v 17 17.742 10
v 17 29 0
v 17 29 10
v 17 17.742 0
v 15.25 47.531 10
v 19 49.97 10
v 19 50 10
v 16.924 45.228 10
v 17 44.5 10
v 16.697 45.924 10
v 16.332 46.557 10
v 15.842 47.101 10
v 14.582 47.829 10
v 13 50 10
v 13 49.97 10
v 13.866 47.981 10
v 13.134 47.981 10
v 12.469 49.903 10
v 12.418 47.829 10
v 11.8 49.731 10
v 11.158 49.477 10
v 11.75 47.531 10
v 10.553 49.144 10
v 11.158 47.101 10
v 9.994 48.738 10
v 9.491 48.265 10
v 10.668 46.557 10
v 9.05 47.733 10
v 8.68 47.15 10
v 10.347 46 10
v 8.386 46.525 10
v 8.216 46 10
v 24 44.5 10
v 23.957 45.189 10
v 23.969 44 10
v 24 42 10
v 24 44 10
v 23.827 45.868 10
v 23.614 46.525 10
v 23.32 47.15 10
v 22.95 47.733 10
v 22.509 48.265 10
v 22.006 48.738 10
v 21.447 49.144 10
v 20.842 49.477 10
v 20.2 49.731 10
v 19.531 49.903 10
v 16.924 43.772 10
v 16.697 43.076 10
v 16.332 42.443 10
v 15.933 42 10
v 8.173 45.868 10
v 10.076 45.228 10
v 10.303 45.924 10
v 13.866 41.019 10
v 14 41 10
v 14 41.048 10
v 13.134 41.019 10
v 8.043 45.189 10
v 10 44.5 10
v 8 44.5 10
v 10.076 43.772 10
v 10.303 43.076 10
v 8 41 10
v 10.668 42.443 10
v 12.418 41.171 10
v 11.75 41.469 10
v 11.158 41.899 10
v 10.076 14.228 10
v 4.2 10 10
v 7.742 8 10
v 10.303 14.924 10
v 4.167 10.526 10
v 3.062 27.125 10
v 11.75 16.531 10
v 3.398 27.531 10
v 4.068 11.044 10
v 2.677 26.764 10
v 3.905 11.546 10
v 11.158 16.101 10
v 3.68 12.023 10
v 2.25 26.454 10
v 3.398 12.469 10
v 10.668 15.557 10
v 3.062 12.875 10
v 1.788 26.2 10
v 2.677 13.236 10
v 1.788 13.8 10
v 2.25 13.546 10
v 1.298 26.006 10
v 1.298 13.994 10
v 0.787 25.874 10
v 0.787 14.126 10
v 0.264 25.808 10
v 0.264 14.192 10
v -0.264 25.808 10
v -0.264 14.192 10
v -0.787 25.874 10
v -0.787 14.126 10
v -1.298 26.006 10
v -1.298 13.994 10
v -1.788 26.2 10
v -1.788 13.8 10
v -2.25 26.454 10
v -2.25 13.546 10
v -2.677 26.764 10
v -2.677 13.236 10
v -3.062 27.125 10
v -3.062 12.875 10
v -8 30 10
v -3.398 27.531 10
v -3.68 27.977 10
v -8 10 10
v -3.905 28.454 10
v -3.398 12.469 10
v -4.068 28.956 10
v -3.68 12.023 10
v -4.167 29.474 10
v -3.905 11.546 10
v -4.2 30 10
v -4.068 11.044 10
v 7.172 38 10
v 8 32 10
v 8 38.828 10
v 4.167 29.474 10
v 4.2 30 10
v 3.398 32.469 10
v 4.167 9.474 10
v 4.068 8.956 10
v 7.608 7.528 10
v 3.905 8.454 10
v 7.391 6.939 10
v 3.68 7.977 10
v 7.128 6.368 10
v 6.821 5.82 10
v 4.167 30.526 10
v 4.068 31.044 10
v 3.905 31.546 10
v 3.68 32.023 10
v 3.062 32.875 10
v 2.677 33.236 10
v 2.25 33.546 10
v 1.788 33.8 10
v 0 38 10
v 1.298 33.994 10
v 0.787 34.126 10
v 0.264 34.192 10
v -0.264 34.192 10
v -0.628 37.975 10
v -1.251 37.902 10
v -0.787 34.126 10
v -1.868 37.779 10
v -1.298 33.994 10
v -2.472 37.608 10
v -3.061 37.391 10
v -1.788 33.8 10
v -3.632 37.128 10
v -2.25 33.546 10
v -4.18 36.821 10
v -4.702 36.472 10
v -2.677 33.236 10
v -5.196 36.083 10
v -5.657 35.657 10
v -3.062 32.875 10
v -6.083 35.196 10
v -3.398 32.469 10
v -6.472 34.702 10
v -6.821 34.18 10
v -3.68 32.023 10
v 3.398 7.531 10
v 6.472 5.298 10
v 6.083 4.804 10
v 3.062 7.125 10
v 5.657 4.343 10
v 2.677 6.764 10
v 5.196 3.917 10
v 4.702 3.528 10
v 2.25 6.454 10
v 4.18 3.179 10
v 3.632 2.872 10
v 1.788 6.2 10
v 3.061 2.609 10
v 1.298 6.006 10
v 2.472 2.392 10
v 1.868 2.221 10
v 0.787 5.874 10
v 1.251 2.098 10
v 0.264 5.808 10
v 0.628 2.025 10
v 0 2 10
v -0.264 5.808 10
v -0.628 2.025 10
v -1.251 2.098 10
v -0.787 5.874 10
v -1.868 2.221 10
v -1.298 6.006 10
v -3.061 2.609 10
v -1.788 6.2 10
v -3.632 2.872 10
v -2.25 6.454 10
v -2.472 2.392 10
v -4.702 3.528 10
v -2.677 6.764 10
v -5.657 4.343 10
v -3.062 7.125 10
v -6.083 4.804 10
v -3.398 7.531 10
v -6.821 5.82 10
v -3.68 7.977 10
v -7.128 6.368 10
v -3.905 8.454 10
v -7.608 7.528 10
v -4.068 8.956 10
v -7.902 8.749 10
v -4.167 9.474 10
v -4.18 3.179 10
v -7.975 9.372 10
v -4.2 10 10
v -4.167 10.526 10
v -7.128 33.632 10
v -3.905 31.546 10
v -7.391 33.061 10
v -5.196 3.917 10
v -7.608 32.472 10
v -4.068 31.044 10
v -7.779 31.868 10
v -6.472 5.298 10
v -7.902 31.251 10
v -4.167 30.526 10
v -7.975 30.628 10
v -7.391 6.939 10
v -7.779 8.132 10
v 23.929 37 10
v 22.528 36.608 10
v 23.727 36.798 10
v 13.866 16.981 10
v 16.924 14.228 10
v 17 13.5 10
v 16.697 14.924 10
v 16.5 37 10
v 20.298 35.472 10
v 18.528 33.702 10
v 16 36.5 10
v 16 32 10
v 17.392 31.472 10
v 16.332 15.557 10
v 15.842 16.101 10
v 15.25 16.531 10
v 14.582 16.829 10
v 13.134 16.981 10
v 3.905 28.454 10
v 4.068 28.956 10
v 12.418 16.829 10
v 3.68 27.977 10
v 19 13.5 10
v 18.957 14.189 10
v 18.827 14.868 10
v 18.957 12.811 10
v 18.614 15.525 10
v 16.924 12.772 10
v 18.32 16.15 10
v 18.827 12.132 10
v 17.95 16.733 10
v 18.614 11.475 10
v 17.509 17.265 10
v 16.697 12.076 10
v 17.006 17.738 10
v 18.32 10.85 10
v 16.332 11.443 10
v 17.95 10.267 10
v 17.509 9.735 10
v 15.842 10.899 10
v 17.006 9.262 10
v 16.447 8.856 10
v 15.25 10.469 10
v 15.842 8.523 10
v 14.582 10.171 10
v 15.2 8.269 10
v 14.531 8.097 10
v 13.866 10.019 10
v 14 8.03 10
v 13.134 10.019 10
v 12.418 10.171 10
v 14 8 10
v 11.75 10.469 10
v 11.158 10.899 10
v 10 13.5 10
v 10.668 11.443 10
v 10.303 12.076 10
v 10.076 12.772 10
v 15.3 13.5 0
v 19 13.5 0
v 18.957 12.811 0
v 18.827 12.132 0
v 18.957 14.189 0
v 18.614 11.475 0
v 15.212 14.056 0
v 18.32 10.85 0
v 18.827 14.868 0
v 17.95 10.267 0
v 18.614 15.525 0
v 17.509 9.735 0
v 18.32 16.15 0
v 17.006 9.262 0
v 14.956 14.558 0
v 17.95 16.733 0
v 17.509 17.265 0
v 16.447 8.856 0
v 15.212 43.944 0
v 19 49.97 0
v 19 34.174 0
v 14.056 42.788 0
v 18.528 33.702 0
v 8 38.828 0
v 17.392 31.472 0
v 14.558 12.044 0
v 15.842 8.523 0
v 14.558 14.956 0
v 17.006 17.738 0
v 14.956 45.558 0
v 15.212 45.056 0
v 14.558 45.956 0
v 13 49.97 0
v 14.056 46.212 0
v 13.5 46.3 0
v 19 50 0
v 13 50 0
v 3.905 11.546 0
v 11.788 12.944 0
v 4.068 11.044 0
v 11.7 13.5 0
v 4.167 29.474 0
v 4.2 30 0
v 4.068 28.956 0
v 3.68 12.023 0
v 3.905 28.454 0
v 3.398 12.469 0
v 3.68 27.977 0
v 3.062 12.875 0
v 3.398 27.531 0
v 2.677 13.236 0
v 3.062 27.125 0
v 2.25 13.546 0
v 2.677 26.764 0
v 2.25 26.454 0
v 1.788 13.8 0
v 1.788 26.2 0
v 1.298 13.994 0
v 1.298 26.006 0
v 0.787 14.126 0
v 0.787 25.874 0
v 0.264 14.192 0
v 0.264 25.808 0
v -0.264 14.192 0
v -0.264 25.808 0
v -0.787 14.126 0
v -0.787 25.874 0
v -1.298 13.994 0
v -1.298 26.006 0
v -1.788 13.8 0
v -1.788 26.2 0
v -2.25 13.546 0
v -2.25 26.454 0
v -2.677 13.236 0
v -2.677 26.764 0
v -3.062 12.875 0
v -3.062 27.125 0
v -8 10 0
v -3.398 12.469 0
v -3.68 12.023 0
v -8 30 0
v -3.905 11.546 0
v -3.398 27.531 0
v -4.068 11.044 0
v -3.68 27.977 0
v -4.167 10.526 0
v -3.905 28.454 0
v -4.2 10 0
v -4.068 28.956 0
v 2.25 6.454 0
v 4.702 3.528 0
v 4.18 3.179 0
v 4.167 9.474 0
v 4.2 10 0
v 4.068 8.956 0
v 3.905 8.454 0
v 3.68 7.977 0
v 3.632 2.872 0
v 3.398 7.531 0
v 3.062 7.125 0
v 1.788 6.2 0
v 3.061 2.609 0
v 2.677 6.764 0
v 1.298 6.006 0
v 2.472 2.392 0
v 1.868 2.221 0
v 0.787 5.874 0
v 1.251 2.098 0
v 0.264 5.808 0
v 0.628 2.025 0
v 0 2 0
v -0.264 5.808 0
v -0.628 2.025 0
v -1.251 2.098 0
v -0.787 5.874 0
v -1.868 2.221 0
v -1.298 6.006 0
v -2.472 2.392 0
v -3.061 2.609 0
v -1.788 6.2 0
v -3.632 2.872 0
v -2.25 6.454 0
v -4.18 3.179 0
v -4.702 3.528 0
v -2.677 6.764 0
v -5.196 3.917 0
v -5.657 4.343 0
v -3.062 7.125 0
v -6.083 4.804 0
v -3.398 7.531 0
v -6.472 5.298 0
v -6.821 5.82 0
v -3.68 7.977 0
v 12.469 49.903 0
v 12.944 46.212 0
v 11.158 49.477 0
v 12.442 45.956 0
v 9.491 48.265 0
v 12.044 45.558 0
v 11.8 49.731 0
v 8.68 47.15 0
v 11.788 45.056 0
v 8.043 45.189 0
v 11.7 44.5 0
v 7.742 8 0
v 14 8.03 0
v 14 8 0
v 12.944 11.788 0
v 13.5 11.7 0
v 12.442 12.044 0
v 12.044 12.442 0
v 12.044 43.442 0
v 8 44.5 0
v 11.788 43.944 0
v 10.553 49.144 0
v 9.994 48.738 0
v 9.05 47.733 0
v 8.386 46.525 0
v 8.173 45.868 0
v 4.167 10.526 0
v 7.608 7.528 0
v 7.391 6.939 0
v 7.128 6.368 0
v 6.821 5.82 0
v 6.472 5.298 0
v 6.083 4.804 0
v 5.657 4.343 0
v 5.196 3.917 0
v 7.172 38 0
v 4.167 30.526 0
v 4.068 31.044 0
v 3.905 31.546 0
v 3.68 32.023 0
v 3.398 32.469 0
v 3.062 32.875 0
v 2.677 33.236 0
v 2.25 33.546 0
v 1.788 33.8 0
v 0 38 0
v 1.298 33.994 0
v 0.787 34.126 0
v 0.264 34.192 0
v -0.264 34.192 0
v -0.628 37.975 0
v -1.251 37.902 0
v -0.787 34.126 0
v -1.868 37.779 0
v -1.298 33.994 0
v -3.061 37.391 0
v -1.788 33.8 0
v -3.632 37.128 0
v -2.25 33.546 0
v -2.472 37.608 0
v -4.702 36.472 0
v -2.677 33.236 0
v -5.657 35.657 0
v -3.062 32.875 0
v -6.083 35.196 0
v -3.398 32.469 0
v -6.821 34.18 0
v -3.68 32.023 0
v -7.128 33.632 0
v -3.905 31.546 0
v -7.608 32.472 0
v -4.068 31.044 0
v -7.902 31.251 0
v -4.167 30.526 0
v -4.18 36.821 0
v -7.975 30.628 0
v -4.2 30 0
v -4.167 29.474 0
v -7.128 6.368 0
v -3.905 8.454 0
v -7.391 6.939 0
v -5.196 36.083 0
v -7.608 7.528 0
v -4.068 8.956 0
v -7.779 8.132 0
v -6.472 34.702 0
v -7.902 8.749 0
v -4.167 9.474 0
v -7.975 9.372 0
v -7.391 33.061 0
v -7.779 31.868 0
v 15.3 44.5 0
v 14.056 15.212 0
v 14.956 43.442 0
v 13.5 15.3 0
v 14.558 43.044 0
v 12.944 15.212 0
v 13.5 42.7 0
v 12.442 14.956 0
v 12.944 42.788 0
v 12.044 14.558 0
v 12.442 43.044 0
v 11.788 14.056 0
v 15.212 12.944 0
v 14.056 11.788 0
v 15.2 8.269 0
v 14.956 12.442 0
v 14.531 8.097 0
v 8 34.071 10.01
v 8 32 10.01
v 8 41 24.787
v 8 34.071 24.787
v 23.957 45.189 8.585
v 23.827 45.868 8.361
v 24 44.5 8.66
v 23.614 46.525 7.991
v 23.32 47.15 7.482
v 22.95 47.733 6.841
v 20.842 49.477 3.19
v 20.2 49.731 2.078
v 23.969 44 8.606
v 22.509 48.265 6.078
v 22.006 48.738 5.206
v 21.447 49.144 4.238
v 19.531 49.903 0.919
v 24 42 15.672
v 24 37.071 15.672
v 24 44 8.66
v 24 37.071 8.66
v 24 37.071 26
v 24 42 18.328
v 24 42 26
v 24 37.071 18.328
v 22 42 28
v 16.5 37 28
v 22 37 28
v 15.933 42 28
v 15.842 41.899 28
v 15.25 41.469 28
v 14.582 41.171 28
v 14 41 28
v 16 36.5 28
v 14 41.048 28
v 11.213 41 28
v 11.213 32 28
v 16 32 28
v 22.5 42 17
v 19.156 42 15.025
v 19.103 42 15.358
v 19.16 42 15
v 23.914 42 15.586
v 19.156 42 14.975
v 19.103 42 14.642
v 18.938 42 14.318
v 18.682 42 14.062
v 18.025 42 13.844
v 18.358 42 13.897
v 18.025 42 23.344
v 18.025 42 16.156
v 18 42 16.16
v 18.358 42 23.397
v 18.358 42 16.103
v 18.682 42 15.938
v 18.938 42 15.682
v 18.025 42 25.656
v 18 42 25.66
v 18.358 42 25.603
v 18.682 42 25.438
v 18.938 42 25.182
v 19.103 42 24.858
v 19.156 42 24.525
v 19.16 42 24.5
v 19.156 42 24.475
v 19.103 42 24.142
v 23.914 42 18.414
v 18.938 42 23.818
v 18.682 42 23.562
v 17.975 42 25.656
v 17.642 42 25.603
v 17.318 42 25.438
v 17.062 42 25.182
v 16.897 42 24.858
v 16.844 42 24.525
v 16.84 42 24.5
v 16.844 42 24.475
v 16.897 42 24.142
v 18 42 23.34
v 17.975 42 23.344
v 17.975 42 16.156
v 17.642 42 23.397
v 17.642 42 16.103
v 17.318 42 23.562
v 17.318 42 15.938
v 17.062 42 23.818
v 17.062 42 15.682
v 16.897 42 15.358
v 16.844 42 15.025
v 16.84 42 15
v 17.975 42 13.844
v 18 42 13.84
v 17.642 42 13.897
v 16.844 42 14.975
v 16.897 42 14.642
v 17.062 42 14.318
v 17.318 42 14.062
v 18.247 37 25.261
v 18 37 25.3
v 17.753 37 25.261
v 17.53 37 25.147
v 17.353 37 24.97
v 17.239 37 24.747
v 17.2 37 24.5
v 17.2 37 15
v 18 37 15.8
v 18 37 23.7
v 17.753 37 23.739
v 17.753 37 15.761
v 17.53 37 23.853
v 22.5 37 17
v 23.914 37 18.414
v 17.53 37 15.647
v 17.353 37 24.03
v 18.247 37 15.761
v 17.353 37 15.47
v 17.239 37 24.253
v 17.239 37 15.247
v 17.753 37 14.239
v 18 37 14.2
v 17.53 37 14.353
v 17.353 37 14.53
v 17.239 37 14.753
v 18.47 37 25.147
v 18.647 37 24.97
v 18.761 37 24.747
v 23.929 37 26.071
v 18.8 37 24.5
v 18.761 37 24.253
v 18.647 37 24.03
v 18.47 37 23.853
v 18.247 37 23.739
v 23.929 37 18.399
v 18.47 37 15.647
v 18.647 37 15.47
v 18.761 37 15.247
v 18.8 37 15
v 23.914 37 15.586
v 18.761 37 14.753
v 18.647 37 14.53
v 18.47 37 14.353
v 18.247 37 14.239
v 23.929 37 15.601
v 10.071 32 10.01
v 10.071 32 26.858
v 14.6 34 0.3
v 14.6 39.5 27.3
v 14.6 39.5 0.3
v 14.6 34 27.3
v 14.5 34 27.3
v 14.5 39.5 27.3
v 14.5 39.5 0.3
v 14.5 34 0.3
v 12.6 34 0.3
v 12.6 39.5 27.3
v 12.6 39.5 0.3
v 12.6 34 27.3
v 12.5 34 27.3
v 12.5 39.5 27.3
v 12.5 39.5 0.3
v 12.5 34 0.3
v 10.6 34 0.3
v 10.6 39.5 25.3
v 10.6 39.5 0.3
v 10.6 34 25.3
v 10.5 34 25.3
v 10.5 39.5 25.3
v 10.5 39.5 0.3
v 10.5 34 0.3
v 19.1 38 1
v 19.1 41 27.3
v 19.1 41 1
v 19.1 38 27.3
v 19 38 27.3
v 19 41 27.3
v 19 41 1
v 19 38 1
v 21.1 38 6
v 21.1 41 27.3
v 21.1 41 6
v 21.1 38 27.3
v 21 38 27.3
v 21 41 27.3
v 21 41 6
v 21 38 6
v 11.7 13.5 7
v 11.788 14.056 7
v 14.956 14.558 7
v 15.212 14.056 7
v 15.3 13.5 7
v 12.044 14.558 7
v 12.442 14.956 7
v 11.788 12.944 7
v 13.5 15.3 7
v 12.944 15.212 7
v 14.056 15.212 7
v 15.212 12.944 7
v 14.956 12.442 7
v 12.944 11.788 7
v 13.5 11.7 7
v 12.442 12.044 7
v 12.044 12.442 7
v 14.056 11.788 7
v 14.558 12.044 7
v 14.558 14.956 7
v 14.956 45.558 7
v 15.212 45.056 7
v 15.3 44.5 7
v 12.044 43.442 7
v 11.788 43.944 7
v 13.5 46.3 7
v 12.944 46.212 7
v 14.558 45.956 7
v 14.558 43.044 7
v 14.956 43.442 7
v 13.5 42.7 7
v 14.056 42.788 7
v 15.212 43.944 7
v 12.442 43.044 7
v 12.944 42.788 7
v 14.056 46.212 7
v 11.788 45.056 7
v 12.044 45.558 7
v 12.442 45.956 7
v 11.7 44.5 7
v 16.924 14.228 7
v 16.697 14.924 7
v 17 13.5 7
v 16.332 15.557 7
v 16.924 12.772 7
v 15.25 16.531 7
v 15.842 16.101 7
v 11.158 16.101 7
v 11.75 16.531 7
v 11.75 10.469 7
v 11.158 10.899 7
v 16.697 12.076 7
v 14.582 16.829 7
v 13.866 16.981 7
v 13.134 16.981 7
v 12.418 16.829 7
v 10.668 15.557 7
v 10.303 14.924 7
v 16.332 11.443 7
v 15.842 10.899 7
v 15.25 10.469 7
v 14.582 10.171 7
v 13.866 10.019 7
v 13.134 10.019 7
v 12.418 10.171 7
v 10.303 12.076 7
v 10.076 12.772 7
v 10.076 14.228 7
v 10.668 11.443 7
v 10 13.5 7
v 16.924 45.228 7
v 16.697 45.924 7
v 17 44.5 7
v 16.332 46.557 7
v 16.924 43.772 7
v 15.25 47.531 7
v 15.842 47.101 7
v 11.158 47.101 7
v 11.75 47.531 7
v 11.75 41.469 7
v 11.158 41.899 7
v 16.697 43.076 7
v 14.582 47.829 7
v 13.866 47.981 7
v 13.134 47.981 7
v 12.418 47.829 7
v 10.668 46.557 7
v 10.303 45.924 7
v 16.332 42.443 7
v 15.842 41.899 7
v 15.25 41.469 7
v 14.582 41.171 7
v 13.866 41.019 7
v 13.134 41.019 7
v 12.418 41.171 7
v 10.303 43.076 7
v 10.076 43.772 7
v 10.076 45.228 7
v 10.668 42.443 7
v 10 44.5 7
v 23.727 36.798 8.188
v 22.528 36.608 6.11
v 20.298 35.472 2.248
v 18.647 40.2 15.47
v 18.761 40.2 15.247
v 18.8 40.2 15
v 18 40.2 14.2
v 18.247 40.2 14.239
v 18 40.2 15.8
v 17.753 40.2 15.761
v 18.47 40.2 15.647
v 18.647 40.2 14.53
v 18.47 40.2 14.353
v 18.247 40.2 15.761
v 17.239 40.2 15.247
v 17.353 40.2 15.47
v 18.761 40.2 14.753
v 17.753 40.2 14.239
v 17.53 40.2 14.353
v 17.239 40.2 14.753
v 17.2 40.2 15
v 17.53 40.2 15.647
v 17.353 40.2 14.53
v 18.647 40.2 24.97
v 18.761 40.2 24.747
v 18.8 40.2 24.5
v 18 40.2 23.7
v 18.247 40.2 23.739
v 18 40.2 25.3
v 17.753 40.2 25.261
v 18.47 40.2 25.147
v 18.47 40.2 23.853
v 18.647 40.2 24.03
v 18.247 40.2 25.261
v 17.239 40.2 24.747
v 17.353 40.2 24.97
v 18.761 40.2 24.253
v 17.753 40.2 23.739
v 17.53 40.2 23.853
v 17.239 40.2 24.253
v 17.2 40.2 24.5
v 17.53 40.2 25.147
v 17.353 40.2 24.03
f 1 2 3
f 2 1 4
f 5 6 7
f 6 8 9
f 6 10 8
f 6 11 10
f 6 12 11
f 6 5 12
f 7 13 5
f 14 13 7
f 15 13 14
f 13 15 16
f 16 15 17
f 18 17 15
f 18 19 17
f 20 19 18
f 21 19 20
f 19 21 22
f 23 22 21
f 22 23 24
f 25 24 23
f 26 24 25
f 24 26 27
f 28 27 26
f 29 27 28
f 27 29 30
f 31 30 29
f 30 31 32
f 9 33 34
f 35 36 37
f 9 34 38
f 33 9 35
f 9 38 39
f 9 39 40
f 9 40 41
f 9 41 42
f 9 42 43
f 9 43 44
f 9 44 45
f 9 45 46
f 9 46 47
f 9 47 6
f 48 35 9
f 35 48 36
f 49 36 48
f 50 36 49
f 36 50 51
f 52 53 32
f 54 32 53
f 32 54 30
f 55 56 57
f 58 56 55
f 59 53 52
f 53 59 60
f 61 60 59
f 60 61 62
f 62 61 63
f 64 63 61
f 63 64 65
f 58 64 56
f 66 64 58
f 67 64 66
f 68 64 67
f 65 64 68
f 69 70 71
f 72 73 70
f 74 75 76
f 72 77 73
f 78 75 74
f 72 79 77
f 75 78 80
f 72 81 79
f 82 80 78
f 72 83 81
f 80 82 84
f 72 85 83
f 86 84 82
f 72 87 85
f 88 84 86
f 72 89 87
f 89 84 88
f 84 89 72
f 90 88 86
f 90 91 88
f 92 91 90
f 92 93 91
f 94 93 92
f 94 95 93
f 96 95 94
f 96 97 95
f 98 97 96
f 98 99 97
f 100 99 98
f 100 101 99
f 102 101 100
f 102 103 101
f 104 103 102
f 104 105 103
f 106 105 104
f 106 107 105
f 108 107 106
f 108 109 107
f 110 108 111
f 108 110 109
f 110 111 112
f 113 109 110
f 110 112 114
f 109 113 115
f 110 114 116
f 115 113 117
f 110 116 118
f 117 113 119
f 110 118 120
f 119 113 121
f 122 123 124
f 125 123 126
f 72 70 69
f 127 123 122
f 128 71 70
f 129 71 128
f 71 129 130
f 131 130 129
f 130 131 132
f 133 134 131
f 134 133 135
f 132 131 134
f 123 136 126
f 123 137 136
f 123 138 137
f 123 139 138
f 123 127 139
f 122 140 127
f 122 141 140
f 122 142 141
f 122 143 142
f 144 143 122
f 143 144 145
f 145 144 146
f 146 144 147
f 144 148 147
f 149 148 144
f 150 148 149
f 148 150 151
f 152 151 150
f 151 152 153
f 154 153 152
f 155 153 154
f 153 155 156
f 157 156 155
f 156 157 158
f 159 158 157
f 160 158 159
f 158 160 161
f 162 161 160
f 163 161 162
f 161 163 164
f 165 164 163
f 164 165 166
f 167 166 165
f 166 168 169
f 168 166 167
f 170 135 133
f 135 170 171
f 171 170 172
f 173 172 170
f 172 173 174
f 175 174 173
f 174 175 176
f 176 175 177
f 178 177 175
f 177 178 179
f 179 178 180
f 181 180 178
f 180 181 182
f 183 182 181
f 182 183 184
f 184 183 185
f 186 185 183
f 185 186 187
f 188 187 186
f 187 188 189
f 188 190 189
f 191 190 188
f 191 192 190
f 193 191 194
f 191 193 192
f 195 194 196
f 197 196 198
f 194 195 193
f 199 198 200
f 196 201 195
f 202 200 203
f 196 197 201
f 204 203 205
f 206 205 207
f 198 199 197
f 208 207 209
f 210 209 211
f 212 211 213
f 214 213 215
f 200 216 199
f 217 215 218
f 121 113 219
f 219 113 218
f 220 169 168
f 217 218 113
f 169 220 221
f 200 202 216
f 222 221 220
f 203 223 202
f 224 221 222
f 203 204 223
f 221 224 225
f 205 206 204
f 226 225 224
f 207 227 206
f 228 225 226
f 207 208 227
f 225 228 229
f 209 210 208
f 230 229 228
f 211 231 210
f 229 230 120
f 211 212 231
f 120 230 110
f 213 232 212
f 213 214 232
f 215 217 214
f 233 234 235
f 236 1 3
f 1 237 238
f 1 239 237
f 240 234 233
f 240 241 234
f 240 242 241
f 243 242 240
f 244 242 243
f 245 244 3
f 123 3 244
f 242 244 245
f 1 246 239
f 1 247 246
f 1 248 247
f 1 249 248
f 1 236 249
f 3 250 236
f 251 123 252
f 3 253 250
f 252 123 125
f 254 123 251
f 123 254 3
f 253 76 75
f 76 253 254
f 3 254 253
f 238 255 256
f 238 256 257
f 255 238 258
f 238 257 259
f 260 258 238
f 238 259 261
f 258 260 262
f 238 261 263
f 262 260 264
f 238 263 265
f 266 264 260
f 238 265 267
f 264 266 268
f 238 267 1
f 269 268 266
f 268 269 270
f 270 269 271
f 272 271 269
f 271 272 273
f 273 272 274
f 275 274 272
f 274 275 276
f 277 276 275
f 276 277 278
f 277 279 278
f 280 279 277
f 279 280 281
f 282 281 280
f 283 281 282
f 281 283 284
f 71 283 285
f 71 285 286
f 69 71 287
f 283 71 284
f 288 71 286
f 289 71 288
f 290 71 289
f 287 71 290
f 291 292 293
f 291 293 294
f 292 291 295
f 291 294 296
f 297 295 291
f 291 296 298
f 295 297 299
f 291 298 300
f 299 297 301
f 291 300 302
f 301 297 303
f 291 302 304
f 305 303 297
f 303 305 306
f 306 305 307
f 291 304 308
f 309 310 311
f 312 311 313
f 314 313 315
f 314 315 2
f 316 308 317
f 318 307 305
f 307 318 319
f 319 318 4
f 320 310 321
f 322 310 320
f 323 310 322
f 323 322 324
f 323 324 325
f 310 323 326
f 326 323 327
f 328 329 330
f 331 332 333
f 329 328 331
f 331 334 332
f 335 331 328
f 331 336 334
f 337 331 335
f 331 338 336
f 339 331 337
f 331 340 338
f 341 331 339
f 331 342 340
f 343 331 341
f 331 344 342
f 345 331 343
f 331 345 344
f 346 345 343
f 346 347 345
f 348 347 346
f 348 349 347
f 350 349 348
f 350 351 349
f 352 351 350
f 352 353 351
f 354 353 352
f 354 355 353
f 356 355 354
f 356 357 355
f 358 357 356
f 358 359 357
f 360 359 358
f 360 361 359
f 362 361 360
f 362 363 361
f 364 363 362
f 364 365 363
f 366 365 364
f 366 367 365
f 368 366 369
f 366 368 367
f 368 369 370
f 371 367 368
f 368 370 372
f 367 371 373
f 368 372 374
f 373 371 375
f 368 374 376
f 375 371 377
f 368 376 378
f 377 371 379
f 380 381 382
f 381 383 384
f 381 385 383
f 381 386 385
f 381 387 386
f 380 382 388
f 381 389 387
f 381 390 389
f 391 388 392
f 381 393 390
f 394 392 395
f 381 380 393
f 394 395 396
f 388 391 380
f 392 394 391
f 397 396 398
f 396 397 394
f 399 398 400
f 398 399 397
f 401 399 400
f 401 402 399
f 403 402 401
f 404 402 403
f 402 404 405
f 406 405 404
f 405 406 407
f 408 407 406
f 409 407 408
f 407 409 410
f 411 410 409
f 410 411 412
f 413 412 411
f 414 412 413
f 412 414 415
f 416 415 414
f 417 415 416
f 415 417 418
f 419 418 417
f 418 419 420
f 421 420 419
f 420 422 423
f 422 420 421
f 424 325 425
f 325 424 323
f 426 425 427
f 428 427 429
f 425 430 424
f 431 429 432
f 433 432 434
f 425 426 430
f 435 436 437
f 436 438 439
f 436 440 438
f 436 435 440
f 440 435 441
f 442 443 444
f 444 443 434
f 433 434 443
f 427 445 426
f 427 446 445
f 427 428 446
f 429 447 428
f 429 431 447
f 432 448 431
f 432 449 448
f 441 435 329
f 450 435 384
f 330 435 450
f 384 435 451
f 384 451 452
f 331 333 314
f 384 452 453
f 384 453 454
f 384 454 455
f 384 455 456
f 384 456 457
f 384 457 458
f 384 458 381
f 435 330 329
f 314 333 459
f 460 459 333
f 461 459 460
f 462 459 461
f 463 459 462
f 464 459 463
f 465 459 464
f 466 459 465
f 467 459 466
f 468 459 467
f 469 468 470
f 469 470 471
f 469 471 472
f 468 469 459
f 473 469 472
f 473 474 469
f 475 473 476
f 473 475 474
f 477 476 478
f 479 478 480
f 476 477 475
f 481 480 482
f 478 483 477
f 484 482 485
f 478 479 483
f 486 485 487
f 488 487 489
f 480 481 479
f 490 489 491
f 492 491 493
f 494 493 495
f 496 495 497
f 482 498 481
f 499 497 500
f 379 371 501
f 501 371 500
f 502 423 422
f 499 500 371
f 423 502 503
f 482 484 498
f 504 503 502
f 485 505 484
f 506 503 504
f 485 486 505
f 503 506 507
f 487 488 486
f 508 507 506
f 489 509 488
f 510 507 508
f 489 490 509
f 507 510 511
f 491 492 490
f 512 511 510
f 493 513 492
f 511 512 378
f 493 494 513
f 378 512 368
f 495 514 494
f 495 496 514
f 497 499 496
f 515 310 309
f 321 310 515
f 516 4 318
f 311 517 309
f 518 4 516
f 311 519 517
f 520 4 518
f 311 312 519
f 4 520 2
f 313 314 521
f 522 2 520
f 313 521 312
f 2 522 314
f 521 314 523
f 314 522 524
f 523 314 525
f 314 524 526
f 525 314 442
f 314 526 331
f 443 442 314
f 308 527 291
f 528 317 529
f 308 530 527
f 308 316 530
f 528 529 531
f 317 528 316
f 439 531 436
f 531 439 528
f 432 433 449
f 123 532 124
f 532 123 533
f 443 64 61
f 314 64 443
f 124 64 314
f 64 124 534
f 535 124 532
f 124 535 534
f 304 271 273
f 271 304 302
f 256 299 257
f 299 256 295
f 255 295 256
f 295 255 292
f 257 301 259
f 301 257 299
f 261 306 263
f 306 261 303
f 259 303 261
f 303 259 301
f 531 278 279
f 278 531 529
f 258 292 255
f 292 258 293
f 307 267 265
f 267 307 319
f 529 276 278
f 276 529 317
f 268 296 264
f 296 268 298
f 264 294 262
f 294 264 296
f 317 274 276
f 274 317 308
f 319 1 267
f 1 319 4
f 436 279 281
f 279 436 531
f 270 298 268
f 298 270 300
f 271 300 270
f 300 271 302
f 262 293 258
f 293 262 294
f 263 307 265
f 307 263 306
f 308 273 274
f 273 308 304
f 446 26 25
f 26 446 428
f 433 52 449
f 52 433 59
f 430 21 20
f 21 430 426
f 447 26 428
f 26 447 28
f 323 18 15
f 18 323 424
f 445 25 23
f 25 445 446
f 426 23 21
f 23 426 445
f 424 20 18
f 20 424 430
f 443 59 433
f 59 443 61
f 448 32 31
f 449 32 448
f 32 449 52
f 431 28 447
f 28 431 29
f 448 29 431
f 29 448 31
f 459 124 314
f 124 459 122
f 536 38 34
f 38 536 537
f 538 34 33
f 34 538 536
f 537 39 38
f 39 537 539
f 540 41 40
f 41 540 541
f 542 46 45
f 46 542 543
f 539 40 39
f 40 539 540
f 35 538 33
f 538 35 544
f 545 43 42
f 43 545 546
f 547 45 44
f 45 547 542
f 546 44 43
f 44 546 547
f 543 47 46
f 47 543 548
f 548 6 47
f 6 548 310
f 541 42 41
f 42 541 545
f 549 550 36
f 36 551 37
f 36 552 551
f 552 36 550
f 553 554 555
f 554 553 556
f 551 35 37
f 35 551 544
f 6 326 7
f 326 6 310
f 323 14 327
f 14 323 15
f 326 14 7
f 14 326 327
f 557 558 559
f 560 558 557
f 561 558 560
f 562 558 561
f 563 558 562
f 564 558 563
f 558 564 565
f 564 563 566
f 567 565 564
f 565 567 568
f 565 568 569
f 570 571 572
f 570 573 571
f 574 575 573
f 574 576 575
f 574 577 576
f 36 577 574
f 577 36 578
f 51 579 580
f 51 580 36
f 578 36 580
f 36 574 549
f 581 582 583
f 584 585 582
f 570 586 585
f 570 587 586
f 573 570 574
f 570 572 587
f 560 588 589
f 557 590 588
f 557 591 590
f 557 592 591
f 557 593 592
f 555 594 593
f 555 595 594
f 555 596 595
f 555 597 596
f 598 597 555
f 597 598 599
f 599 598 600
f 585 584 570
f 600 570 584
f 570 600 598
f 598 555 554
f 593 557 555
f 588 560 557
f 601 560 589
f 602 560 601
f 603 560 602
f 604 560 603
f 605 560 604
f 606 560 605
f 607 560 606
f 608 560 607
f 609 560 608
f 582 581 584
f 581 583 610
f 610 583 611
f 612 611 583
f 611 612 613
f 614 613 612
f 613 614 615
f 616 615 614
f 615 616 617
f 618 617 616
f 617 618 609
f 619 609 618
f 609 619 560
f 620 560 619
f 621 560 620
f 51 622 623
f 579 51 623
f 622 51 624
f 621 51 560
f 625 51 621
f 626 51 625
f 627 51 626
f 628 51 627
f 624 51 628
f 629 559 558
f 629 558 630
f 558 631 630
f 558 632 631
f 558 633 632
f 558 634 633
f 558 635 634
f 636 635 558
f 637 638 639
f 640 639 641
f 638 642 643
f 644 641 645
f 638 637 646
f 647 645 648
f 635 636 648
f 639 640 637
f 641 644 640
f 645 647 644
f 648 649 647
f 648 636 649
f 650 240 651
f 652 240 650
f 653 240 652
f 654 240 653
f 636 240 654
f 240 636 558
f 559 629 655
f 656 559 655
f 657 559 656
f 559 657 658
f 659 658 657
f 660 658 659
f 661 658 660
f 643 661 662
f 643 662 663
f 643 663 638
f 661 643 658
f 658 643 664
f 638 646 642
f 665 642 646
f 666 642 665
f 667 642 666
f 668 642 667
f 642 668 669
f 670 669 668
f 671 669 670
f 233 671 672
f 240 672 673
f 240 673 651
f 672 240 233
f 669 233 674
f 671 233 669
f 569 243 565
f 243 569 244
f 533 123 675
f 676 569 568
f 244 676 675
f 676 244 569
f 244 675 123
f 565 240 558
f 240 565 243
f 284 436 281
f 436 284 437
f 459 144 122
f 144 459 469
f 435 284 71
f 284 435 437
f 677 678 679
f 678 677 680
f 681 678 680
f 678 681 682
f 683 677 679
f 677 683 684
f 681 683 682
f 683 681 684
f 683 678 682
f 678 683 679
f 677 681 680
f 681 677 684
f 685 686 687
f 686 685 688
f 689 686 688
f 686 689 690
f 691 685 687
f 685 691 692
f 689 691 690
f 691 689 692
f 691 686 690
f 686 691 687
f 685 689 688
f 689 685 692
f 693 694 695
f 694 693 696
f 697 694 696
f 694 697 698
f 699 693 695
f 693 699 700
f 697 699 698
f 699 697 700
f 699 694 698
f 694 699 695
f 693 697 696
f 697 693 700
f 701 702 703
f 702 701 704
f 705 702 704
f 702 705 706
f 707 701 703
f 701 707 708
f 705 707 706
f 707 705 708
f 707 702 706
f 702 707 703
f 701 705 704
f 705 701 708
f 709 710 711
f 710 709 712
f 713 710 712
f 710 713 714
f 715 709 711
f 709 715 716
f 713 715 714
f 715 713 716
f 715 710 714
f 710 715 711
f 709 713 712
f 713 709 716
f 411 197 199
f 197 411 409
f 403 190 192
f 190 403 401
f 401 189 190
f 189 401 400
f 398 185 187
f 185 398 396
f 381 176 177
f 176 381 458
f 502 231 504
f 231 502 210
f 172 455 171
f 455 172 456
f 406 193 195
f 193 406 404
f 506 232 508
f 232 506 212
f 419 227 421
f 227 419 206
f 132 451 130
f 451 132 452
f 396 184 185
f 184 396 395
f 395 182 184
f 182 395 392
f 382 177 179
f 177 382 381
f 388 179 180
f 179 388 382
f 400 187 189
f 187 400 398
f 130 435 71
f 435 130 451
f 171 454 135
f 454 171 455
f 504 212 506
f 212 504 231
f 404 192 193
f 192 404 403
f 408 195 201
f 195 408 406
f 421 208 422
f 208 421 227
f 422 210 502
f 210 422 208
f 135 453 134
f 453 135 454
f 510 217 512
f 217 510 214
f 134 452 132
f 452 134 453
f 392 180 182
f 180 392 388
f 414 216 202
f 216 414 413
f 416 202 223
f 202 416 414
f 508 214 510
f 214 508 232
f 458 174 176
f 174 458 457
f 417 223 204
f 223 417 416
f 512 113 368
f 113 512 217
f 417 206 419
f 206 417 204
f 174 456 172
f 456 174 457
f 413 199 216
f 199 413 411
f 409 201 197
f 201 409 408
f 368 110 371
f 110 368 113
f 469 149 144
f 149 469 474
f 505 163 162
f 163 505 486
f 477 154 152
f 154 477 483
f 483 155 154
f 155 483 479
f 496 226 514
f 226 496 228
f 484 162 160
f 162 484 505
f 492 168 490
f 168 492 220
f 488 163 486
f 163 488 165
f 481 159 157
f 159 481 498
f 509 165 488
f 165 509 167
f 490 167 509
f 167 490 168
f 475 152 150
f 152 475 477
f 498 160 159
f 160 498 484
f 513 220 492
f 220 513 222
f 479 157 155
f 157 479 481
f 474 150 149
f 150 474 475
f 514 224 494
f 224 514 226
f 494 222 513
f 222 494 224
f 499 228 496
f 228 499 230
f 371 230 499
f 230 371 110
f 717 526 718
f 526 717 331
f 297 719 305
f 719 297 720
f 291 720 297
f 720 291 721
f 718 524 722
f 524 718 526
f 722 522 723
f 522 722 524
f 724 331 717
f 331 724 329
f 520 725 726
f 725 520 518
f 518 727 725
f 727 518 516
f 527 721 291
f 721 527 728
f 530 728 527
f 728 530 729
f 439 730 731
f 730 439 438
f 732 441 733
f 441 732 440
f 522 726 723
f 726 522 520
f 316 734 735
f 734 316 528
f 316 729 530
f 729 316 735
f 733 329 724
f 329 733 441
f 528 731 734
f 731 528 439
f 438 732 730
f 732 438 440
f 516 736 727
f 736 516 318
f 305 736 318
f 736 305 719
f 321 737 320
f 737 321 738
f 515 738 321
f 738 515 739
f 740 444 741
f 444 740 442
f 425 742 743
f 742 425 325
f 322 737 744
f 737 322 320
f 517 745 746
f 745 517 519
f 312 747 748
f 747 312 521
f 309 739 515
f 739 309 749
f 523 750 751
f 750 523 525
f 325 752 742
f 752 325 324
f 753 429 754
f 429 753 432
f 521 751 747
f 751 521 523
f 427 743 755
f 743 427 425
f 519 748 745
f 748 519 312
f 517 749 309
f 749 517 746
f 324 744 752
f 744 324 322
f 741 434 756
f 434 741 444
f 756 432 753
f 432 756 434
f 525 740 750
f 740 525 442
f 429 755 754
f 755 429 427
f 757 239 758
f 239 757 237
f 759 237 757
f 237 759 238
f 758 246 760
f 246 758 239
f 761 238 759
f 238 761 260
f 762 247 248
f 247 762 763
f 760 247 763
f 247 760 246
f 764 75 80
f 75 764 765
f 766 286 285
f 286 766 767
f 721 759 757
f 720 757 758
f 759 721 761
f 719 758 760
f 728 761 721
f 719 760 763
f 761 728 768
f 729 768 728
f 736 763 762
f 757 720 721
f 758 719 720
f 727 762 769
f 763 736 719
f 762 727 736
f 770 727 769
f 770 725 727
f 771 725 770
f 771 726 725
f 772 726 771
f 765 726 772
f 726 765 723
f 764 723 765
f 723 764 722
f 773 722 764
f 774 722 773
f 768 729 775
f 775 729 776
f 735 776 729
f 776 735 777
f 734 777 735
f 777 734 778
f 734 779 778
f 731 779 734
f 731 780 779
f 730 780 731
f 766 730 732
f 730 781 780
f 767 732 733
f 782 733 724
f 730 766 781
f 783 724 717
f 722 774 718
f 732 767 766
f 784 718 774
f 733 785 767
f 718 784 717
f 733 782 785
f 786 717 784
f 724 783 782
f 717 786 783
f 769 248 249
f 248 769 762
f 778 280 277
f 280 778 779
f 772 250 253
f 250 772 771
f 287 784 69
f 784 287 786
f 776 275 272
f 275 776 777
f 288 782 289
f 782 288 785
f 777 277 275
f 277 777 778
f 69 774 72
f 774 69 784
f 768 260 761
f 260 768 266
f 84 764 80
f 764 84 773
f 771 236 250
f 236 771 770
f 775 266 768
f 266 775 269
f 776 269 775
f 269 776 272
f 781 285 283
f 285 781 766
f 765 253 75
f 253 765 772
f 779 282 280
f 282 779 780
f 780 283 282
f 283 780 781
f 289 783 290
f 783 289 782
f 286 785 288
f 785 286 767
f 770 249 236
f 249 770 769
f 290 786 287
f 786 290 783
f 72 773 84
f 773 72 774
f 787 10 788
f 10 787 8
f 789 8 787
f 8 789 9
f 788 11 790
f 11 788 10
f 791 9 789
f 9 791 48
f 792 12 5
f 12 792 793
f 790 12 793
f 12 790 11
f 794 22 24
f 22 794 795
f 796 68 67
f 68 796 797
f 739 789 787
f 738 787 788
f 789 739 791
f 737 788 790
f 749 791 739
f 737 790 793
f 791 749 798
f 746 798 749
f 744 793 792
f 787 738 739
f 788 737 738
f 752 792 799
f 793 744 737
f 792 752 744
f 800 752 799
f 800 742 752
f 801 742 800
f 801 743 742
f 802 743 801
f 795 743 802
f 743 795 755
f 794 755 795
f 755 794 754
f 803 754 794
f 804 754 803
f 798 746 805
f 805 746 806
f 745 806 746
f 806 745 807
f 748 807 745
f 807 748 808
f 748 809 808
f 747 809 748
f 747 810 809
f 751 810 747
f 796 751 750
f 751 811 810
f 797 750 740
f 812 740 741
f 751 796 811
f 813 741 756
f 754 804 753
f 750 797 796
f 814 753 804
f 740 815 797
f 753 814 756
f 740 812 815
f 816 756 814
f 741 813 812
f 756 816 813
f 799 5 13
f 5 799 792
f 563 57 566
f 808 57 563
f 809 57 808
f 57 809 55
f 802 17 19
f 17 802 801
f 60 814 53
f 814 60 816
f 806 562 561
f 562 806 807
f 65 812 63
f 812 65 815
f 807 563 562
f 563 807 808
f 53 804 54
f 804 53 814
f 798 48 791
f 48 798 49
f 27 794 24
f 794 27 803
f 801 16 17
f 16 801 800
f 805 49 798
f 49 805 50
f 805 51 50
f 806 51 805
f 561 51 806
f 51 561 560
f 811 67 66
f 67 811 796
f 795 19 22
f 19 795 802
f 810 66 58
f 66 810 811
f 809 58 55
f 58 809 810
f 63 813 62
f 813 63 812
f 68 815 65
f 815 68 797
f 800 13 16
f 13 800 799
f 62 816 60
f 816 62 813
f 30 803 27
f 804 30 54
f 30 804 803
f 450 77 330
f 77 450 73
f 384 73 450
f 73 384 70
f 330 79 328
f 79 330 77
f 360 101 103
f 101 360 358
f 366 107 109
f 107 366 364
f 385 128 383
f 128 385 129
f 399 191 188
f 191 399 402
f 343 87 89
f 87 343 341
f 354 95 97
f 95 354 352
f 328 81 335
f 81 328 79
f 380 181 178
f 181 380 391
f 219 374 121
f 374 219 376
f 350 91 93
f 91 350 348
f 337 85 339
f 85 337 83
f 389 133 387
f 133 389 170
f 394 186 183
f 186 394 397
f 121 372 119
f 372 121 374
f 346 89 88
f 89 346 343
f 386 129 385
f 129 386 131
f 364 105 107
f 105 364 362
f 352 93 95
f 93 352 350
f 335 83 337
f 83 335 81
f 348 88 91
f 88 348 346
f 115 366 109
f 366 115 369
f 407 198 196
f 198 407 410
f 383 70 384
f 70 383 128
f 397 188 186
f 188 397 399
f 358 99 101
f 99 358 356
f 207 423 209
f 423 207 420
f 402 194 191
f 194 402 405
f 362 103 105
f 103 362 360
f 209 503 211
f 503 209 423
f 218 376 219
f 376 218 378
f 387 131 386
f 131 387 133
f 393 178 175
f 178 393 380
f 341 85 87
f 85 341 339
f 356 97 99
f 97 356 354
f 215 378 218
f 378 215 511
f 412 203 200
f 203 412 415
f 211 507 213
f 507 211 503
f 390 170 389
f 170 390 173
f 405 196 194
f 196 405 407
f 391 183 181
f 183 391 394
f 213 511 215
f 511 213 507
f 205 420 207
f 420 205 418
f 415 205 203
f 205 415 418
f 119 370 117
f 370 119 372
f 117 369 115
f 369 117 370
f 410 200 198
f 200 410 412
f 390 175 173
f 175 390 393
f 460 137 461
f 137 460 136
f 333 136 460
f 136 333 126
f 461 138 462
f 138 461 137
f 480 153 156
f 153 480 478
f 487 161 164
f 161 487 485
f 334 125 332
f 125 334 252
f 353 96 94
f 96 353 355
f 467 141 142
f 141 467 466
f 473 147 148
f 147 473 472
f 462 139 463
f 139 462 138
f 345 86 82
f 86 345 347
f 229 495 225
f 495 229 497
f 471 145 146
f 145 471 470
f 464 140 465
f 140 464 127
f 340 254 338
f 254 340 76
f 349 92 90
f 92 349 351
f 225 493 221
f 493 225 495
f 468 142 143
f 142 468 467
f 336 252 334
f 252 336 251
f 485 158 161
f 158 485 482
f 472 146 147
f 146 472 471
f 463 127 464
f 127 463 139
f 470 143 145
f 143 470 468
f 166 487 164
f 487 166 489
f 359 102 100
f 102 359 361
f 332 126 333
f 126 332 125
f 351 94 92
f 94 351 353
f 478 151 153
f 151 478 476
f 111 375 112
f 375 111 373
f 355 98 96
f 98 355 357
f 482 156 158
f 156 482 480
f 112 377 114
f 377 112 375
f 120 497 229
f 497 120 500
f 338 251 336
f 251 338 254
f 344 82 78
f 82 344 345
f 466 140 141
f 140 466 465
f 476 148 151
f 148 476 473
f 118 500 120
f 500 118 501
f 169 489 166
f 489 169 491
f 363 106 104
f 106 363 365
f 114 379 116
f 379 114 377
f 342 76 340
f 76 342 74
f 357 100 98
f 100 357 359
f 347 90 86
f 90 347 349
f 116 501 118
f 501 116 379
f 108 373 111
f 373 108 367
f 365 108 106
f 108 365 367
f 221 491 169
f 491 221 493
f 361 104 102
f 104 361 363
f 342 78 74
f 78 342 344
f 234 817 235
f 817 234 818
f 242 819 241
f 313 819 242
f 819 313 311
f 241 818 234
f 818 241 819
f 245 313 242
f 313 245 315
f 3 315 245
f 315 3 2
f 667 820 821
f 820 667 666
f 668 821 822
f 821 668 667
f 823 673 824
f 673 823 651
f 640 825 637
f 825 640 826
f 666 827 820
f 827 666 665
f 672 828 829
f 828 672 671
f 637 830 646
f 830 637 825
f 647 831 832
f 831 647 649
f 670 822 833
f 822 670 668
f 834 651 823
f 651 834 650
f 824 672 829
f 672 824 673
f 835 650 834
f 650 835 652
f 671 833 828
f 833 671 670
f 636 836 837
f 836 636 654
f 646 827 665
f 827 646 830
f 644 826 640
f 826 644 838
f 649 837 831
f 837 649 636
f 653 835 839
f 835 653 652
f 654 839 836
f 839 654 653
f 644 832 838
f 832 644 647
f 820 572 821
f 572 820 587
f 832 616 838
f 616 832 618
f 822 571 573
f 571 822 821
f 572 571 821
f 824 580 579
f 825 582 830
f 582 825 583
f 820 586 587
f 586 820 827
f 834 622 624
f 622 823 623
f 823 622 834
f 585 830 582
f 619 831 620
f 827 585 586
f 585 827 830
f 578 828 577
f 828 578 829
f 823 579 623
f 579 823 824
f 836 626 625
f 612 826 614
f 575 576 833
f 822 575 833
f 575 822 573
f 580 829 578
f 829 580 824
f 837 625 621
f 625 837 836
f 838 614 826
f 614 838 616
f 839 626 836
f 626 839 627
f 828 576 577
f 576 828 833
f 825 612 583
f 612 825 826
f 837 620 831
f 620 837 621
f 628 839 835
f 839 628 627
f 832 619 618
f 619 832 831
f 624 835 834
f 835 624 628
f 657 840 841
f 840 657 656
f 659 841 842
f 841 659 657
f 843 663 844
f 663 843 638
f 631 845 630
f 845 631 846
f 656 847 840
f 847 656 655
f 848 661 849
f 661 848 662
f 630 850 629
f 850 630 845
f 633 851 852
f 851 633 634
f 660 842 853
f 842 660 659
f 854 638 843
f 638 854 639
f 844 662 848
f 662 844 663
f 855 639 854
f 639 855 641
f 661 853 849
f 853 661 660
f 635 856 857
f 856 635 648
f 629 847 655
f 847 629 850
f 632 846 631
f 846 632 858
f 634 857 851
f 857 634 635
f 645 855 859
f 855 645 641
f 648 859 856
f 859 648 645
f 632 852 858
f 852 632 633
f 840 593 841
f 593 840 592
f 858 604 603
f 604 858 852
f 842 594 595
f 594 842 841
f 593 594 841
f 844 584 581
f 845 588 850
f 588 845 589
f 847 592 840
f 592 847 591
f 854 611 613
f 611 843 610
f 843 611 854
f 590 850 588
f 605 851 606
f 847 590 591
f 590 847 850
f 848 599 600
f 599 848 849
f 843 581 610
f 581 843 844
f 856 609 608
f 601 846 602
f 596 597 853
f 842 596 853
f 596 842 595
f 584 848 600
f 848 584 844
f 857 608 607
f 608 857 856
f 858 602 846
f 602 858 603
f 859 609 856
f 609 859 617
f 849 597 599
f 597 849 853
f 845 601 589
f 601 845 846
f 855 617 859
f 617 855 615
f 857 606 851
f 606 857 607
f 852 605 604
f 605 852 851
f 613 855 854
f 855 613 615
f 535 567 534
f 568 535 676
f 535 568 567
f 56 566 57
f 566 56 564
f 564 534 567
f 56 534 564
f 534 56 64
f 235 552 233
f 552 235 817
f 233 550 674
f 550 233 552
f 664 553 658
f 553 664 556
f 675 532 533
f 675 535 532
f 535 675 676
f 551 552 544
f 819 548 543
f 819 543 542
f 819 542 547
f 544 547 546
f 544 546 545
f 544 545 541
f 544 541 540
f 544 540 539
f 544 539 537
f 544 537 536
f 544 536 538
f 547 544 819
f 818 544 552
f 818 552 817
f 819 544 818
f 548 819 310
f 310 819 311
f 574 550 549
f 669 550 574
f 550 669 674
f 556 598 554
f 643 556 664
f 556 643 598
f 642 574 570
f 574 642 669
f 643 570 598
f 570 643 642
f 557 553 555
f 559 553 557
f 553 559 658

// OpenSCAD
// PRUSA iteration3
// Y motor mount
// GNU GPL v3
// Josef Průša <iam@josefprusa.cz> and contributors
// http://www.reprap.org/wiki/Prusa_Mendel
// http://prusamendel.org

//include <configuration.scad>

module y_motor_base(){
    
    union()
    {
    // Motor holding part
    translate(v = [29,-21+50,0]){
        
    difference()
    {    
     union()
    {
    translate(v = [-21+4.5,0,5]) cube(size = [9,31,10], center=true);
    translate(v = [-15.5,-15.5,0]) cylinder(h = 10, r=5.5, $fn=50);
    translate(v = [-15.5,+15.5,0]) cylinder(h = 10, r=5.5, $fn=50);
    translate([-21,7,0]) rotate([0,0,45]) cube([2, 2, 10]);    

    //end stop
    translate(v = [-10.5,+15.5,0]) cylinder(h = 10, r=5.5, $fn=50);
    translate([-12,0,0]) cube([7, 15, 10]);
    translate([-16,16,0]) cube([6, 5, 10]);
    translate([-21+6,8,0]) cube([12-2, 5, 28]);    
    translate([-21,8-5,0]) cube([8, 10, 28]);      
    translate([-21+9.5-2,7,0]) rotate([0,0,45]) cube([2, 2, 28]);    
    // Joins motor holder and rod plate
    translate(v = [-29,-21,0]) cube(size = [14,30,10]);
    }    
        //selective infill
        translate([-14.5,5,0.3]) cube([0.1,5.5,27]);
        translate([-16.5,5,0.3]) cube([0.1,5.5,27]);
        translate([-18.5,5,0.3]) cube([0.1,5.5,25]);
        translate([-10,9,1]) cube([0.1,3,26.3]);
        translate([-8,9,6]) cube([0.1,3,21.3]);
        
    }
}
}
     // Front holding part
     translate(v = [0,10,0]) cylinder(h = 10, r=8, $fn=80);
     translate(v = [0,20,5])cube(size = [16,20,10], center=true);	
     translate(v = [0,30,0])cylinder(h = 10, r=8, $fn=80);
}

module y_motor_holes(){
    translate(v = [29,-21+50,0]){
    // Screw head holes
    translate(v = [-15.5,-15.5,-1]) cylinder(h = 10, r=1.8, $fn=20);
    translate(v = [-15.5,+15.5,-1]) cylinder(h = 10, r=1.8, $fn=20);
    // Screw holes
    translate(v = [-15.5,-15.5,7]) cylinder(h = 7, r=3.5, $fn=30);
    translate(v = [-15.5,+15.5,7]) cylinder(h = 25, r=3.5, $fn=30);
 }
    translate(v = [0,10,-1]) cylinder(h = 12, r=4.2, $fn=50);	
    translate(v = [0,30,-1]) cylinder(h = 12, r=4.2, $fn=50);
 
    //endstop
    translate([25,29,0])  cylinder(h = 29, r=8, $fn=20); 
   
    translate([18,45,15]) rotate([90,0,0]) cylinder(h = 10, r=0.8, $fn=20);
    translate([18,42.2,15]) rotate([90,0,0]) cylinder(h = 2, r1=1.2, r2=0.8, $fn=20);
 
    translate([18,45,24.5]) rotate([90,0,0]) cylinder(h = 10, r=0.8, $fn=20);
    translate([18,42.2,24.5]) rotate([90,0,0]) cylinder(h = 2, r1=1.2, r2=0.8, $fn=20);
   
    // endstop corner cutout
    translate([-10,30,28]) rotate([0,45,0]) cube([15, 19, 15]);	
    translate([-1,41,10])  cube([15, 5, 19]);	
    translate([27,33,0]) rotate([0,0,45]) cube([5, 5, 28]);	
    translate([7,28,10.01]) rotate([0,0,45]) cube([5, 5, 28]); 
    
    translate([19,32,0]) rotate([0,30,0]) cube([8, 20, 18]);	
    translate([24.5-2,32,17]) rotate([0,45,0]) cube([2, 20, 2]);	
    
    translate([23-2,32,29]) rotate([0,45,0]) cube([5, 20, 5]);	
}





// Final part
module y_motor(){
    difference()
    {
        y_motor_base();
        y_motor_holes();
    }
}


y_motor();
